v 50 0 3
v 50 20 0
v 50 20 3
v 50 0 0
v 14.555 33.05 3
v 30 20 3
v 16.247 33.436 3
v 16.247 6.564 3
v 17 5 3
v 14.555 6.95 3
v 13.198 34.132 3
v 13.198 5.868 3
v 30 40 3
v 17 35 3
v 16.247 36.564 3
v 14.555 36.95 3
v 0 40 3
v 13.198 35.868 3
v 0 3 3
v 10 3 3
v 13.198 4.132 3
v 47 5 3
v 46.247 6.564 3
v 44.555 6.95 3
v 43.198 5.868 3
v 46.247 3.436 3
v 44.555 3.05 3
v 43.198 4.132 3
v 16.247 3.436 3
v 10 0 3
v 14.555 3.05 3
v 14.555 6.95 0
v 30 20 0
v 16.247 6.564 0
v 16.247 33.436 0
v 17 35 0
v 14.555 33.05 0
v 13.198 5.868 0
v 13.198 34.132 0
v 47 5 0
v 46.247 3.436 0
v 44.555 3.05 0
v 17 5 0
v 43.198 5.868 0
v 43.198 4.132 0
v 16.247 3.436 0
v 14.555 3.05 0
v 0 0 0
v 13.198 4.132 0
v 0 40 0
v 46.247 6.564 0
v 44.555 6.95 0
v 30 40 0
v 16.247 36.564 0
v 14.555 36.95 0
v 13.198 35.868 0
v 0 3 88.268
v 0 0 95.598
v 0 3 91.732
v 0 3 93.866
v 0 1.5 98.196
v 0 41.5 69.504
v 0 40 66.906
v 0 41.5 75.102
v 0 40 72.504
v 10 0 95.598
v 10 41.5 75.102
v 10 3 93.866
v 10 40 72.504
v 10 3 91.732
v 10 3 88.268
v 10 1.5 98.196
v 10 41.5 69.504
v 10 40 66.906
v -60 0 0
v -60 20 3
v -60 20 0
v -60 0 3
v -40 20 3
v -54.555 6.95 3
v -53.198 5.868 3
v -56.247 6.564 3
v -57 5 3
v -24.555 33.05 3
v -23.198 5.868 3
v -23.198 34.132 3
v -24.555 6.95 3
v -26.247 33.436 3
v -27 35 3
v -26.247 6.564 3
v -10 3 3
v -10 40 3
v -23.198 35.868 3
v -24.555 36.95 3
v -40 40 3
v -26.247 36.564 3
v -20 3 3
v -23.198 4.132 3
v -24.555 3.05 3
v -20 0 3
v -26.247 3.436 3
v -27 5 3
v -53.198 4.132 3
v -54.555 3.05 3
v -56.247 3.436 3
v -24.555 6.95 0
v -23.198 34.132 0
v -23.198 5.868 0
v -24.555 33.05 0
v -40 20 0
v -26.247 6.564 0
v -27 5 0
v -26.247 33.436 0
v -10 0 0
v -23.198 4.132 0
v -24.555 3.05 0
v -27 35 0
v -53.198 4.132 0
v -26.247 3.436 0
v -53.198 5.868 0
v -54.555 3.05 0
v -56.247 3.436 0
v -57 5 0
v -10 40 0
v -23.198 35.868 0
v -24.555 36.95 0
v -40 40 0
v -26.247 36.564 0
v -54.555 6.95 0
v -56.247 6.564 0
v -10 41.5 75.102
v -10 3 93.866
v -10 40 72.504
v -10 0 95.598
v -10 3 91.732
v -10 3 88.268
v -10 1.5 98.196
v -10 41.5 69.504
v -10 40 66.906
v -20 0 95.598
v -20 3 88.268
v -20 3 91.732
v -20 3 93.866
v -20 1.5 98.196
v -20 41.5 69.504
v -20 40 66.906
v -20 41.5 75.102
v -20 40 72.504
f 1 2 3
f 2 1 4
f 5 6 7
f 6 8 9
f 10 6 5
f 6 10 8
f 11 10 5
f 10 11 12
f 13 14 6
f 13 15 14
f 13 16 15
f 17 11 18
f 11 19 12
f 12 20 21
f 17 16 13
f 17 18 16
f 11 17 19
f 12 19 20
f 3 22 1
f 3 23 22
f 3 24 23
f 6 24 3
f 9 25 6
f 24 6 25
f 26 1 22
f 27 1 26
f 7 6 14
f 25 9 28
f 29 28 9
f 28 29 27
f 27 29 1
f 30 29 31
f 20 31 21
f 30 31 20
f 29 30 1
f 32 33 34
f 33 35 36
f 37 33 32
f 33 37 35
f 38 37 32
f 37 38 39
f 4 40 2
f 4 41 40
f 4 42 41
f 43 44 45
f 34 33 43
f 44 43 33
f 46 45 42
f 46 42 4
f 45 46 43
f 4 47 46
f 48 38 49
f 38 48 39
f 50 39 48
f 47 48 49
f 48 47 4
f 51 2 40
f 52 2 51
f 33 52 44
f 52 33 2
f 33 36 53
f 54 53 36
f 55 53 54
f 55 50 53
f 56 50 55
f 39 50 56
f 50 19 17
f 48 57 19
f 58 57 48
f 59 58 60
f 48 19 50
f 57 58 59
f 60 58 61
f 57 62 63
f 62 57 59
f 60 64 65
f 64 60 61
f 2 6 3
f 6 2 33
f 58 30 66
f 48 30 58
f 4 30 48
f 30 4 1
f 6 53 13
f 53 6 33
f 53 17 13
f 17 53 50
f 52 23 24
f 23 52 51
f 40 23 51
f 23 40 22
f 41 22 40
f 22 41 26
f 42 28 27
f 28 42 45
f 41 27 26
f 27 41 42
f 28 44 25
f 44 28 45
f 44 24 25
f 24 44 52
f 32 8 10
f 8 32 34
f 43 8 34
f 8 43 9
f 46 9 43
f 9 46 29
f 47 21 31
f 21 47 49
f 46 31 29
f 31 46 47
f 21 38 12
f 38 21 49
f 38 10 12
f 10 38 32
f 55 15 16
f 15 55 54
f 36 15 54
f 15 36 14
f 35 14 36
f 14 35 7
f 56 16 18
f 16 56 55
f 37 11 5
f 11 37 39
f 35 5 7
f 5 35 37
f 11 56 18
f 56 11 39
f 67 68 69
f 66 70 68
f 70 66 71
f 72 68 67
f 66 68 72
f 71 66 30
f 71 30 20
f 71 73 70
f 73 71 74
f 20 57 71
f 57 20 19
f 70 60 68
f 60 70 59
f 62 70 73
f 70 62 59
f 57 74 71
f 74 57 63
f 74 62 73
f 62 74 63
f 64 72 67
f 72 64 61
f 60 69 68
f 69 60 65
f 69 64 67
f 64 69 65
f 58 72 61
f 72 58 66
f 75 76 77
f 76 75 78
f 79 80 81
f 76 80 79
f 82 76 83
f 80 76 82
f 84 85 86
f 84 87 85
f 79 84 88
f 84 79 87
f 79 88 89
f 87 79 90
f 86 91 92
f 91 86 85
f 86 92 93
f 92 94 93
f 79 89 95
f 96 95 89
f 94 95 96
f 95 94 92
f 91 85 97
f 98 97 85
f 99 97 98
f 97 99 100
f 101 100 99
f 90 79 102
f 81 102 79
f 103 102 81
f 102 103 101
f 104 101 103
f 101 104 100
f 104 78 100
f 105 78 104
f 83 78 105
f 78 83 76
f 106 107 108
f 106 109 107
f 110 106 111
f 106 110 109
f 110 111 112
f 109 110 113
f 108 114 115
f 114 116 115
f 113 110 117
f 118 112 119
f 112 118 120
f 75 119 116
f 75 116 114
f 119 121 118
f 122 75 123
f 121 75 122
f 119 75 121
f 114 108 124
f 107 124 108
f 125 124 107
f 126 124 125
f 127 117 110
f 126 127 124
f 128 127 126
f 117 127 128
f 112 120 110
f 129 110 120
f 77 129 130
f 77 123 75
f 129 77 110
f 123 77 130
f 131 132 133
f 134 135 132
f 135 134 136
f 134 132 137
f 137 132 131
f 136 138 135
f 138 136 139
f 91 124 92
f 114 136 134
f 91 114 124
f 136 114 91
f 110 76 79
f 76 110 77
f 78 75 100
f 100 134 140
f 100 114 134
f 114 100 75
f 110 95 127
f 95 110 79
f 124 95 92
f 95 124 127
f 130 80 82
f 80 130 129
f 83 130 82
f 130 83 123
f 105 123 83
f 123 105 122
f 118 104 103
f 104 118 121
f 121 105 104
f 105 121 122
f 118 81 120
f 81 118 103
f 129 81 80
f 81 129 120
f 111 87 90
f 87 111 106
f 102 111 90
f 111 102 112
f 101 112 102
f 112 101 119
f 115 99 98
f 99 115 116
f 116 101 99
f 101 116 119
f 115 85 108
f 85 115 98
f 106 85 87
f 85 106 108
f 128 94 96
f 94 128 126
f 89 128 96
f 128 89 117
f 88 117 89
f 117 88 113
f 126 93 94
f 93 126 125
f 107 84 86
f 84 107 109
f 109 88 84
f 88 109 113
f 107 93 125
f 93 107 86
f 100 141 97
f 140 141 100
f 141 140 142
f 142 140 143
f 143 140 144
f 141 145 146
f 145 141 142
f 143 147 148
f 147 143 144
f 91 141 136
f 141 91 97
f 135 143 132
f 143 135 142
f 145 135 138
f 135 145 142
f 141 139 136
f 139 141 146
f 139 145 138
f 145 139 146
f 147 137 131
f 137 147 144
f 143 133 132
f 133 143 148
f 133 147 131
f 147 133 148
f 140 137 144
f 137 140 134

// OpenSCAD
module Holder(angle=30, thickness=3, width=40, height=90, lenght_x=50, panel_thickness = 3, x_size = 50, y_size = 40, cut_out_size = 20, z_size = 10, hole_radius = 2, hole_margin=5) {
    difference() {
        union() {
            cube([x_size, y_size - cut_out_size, thickness]);
            cube([x_size - cut_out_size, width, thickness]);
        }
        
        translate([x_size - hole_margin, hole_margin, -1]) {
            #cylinder(r = hole_radius, h = thickness + 2);
        }
        
        translate([z_size + hole_margin, hole_margin, -1]) {
            #cylinder(r = hole_radius, h = thickness + 2);
        }
        
        translate([z_size + hole_margin, y_size - hole_margin, -1]) {
            #cylinder(r = hole_radius, h = thickness + 2);
        }
    }
    cube([z_size, thickness, height + panel_thickness * cos(angle) + thickness]);
    
    length_holder = width / cos(angle);
    
    translate([0, 0, height]) {
        rotate([-angle, 0, 0]) {
            cube([10, length_holder, thickness]);
        }
    }
    
    translate([0, 0, height + panel_thickness * cos(angle) + thickness]) {
        rotate([-angle, 0, 0]) {
            cube([10, length_holder, thickness]);
        }
    }
}

Holder();

translate([-10, 0, 0]) mirror([1,0,0]) {
    Holder();
}
